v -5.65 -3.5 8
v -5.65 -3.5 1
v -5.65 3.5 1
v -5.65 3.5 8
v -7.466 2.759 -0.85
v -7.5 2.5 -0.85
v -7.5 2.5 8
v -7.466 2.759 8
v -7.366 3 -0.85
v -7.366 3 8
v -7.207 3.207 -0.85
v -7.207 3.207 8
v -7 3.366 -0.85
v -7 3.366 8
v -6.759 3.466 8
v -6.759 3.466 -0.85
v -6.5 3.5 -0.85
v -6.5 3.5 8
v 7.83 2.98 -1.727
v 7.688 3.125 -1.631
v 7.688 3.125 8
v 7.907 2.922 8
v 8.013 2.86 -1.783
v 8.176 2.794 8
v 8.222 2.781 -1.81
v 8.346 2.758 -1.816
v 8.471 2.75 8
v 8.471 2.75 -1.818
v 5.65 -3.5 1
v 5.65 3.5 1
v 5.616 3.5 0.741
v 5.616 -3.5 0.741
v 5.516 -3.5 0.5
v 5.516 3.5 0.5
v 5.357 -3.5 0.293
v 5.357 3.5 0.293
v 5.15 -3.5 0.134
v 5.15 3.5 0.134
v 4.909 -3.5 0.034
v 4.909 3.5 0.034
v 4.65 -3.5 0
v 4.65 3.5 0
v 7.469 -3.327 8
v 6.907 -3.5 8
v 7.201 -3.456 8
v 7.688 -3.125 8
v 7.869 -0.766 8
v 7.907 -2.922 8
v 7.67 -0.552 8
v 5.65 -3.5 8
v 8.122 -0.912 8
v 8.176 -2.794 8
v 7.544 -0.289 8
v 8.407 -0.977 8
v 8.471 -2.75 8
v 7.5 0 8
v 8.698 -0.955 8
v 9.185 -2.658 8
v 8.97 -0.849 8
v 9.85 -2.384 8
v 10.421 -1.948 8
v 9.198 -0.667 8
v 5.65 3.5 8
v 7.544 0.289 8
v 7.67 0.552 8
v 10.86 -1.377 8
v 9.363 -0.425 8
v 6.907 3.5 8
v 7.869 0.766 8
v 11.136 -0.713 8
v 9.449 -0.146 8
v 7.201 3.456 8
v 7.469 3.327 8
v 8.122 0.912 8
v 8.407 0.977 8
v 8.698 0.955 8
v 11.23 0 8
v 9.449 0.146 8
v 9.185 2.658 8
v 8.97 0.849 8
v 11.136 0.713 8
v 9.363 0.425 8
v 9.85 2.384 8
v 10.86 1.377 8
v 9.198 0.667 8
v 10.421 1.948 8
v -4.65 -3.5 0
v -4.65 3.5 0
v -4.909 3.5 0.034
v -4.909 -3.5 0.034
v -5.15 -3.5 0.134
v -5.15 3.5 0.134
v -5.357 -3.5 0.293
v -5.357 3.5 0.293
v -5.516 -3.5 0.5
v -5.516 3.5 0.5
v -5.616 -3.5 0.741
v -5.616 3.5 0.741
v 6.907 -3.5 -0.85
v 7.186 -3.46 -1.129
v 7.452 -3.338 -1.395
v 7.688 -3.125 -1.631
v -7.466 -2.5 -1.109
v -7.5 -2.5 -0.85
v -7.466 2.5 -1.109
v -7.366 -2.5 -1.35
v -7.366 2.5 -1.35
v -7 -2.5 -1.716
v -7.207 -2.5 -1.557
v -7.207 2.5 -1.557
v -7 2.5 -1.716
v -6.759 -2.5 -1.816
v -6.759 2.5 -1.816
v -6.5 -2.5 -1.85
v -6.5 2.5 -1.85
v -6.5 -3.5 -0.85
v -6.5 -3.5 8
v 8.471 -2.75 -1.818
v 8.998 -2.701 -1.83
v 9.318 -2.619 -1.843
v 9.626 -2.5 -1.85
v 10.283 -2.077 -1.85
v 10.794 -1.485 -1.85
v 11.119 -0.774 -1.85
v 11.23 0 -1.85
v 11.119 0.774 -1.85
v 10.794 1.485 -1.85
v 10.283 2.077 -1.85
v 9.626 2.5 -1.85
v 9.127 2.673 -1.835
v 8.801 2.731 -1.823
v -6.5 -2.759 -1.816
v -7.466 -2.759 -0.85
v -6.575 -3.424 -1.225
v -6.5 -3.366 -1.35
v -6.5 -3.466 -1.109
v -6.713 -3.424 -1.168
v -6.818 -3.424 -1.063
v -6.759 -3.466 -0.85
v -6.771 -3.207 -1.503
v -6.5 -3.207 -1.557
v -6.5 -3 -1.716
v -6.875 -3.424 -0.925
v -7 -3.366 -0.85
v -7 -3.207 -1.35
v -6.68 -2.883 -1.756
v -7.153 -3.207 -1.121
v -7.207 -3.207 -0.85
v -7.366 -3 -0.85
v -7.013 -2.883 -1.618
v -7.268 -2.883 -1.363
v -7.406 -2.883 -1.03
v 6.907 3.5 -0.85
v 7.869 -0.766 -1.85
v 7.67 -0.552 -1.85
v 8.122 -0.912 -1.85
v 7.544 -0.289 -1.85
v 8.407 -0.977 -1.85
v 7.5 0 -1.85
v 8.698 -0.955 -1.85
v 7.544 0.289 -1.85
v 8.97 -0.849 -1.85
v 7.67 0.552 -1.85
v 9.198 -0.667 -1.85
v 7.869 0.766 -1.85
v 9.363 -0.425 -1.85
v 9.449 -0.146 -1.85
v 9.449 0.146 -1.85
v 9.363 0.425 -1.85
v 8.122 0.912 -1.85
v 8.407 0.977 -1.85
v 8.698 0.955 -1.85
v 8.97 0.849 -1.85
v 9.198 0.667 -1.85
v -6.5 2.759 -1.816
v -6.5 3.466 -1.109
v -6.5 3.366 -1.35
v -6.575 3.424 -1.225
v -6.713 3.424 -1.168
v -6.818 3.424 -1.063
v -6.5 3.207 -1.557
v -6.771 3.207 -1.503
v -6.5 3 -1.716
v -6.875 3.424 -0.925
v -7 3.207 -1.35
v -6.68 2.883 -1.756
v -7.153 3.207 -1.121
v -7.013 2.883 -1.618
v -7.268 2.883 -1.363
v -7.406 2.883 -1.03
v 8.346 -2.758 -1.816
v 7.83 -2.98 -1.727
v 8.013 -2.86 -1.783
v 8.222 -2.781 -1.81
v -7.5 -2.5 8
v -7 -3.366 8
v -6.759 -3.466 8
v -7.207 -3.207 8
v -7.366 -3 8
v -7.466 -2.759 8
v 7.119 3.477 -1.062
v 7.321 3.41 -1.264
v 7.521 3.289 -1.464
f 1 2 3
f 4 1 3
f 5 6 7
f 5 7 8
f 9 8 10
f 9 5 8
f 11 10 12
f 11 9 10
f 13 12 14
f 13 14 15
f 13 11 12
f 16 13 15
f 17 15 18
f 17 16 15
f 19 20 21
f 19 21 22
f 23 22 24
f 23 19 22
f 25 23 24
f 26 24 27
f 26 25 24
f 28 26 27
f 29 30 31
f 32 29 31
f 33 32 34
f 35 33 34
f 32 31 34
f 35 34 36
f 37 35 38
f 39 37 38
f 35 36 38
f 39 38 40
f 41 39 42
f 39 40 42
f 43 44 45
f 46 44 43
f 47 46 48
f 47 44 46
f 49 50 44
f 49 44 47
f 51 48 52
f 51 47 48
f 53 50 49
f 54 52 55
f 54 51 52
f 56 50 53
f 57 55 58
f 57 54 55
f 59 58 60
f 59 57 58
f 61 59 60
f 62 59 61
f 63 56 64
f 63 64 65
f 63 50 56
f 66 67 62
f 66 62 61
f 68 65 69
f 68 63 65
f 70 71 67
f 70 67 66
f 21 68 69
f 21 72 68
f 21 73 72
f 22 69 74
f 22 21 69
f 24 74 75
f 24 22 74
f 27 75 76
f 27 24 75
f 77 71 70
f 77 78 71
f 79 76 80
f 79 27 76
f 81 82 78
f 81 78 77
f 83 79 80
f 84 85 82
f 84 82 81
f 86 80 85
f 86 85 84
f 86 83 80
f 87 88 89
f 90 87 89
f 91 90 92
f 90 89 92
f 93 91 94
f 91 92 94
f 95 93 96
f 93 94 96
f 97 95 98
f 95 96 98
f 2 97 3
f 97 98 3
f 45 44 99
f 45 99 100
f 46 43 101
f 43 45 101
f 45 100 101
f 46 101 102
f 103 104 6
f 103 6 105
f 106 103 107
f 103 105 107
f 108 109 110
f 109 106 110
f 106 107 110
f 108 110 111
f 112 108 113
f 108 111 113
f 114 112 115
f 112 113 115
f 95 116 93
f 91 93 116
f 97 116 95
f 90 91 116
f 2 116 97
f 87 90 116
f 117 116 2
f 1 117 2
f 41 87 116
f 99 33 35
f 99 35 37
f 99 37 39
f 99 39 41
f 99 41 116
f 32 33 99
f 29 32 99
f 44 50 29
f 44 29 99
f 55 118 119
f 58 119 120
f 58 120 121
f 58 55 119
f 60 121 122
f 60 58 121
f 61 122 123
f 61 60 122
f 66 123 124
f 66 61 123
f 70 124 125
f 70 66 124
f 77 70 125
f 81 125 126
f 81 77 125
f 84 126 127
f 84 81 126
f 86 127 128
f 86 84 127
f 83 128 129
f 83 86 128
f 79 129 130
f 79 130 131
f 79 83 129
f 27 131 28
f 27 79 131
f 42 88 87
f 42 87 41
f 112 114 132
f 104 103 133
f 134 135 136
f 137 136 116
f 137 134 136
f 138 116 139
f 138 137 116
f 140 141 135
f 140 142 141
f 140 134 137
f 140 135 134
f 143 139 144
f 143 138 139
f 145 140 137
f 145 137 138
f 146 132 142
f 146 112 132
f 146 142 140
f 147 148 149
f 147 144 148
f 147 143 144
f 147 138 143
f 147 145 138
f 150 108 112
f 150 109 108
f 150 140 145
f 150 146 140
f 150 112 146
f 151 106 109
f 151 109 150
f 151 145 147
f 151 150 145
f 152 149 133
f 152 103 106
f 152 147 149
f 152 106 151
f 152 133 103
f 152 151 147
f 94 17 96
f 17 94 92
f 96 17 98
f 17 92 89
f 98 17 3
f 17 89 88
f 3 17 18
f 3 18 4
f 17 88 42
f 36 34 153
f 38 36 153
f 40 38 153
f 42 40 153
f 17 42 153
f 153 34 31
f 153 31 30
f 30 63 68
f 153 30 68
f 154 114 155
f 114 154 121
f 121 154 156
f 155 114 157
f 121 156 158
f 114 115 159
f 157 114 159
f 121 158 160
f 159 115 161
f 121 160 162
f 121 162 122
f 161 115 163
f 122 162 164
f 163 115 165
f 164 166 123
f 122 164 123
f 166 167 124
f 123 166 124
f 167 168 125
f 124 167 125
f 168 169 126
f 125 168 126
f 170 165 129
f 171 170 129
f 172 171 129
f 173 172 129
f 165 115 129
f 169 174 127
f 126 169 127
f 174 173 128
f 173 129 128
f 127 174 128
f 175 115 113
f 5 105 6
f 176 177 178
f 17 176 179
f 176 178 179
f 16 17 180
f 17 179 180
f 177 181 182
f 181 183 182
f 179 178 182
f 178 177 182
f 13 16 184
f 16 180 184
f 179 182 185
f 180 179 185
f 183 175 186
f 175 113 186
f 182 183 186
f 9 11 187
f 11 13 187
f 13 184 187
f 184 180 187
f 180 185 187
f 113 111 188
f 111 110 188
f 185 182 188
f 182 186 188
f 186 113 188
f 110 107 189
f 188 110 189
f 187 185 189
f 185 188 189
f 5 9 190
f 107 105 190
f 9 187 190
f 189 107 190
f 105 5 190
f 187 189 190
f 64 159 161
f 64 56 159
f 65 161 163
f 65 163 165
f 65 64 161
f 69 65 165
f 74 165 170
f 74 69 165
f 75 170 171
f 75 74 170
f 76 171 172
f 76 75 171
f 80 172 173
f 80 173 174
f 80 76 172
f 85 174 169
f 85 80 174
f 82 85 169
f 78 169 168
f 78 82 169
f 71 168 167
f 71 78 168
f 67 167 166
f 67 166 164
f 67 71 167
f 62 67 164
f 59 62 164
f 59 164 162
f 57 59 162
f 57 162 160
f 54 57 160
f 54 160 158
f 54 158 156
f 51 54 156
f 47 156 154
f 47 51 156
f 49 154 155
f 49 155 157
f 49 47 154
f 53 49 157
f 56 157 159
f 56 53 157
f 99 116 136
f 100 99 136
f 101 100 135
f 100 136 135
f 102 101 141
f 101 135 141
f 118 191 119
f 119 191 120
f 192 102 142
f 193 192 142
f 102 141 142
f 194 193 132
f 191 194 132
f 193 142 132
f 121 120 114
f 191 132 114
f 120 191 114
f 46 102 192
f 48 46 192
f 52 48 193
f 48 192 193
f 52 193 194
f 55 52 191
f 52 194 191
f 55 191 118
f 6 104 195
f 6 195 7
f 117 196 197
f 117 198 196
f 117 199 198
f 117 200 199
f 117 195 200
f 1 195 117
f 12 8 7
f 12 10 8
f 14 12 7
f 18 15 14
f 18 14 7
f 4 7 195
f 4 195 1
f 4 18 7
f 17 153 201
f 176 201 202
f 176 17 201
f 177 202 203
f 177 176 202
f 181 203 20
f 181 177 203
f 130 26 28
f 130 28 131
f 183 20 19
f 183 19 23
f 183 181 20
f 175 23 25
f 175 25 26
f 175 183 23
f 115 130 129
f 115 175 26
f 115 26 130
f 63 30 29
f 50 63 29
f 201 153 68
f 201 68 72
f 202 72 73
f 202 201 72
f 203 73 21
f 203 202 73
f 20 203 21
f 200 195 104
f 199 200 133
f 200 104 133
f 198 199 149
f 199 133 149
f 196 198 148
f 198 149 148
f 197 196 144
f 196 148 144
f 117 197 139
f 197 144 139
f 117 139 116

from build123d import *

# Parameters (mm, degrees)
F0_W         = 1.85
F0_H         = 7
F0_W_2       = 11.3
F1_DEPTH     = 1.85
F2_DEPTH     = 8
F3_T1_DEPTH  = 9.85
F3_T3_DEPTH  = 9.85
F3_T5_DEPTH  = 7
F3_T7_DEPTH  = 7
F3_T9_DEPTH  = 12
F4_T1_DEPTH  = 11.35
F4_T3_DEPTH  = 16.5
F4_T5_DEPTH  = 12.8150682373
F4_T8_ANGLE  = 90.0000000053
F4_T10_ANGLE = 90.0000000053


# Not quite as in the source:
# - a fillet or chamfer that OpenCascade refuses, or shapes differently, is made with other operations: its cross-section is extruded or revolved along the edge and cut away or added


with BuildPart() as f1:
    # F0 (on Top) → F1 (new body)
    with BuildSketch(Plane.XY):
        with Locations((-6.575, 0)):
            Rectangle(F0_W, F0_H)
        Rectangle(F0_W_2, F0_H)
        with BuildLine():
            Line((7.5, 0), (7.5, 2.5694551952))
            ThreePointArc((7.5, 2.5694551952), (5.73, 0), (7.5, -2.5694551952))
            Line((7.5, -2.5694551952), (7.5, 0))
        make_face()
        with BuildLine():
            Line((7.5, 2.5694551952), (7.5, 3.5))
            Line((7.5, 3.5), (5.65, 3.5))
            Line((5.65, 3.5), (5.65, -3.5))
            Line((5.65, -3.5), (7.5, -3.5))
            Line((7.5, -3.5), (7.5, -2.5694551952))
            ThreePointArc((7.5, -2.5694551952), (5.73, 0), (7.5, 2.5694551952))
        make_face()
        with BuildLine():
            ThreePointArc((11.23, 0), (10.0400480762, 2.2646743695), (7.5, 2.5694551952))
            Line((7.5, 2.5694551952), (7.5, 0))
            Line((7.5, 0), (7.5, -2.5694551952))
            ThreePointArc((7.5, -2.5694551952), (10.0400480762, -2.2646743695), (11.23, 0))
        make_face()
        with BuildLine():
            ThreePointArc((9.46, 0), (8.48, -0.98), (7.5, 0))
            ThreePointArc((7.5, 0), (8.48, 0.98), (9.46, 0))
        make_face(mode=Mode.SUBTRACT)
    extrude(amount=-F1_DEPTH)

    # F0 (on Top) → F2 (join)
    with BuildSketch(Plane.XY):
        with Locations((-6.575, 0)):
            Rectangle(F0_W, F0_H)
        with BuildLine():
            Line((7.5, 2.5694551952), (7.5, 3.5))
            Line((7.5, 3.5), (5.65, 3.5))
            Line((5.65, 3.5), (5.65, -3.5))
            Line((5.65, -3.5), (7.5, -3.5))
            Line((7.5, -3.5), (7.5, -2.5694551952))
            ThreePointArc((7.5, -2.5694551952), (5.73, 0), (7.5, 2.5694551952))
        make_face()
        with BuildLine():
            Line((7.5, 0), (7.5, 2.5694551952))
            ThreePointArc((7.5, 2.5694551952), (5.73, 0), (7.5, -2.5694551952))
            Line((7.5, -2.5694551952), (7.5, 0))
        make_face()
        with BuildLine():
            ThreePointArc((11.23, 0), (10.0400480762, 2.2646743695), (7.5, 2.5694551952))
            Line((7.5, 2.5694551952), (7.5, 0))
            Line((7.5, 0), (7.5, -2.5694551952))
            ThreePointArc((7.5, -2.5694551952), (10.0400480762, -2.2646743695), (11.23, 0))
        make_face()
        with BuildLine():
            ThreePointArc((9.46, 0), (8.48, -0.98), (7.5, 0))
            ThreePointArc((7.5, 0), (8.48, 0.98), (9.46, 0))
        make_face(mode=Mode.SUBTRACT)
    extrude(amount=F2_DEPTH)

    # F3: fillet of radius 1 on 5 edges, made by hand

    # F3_s2 → F3_t1 (join)
    with BuildSketch(Plane.XY.offset(-1.85)):
        with BuildLine():
            ThreePointArc((7.5, 3.5), (7.8571098794, 2.9584596209), (8.4713837652, 2.7499865019))
            ThreePointArc((8.4713837652, 2.7499865019), (7.9775177584, 2.7037033116), (7.5, 2.5694551952))
            Line((7.5, 2.5694551952), (7.5, 3.5))
        make_face()
    extrude(amount=F3_T1_DEPTH)

    # F3_s4 → F3_t3 (join)
    with BuildSketch(Plane.XY.offset(-1.85)):
        with BuildLine():
            ThreePointArc((7.5, -3.5), (7.8571098794, -2.9584596209), (8.4713837652, -2.7499865019))
            ThreePointArc((8.4713837652, -2.7499865019), (7.9775177584, -2.7037033116), (7.5, -2.5694551952))
            Line((7.5, -2.5694551952), (7.5, -3.5))
        make_face()
    extrude(amount=F3_T3_DEPTH)

    # F3_s6 → F3_t5 (join)
    with BuildSketch(Plane.XZ.offset(-3.5)):
        with BuildLine():
            ThreePointArc((5.65, 1), (5.3571067812, 0.2928932188), (4.65, 0))
            Line((4.65, 0), (5.65, 0))
            Line((5.65, 0), (5.65, 1))
        make_face()
    extrude(amount=F3_T5_DEPTH)

    # F3_s8 → F3_t7 (join)
    with BuildSketch(Plane.XZ.offset(-3.5)):
        with BuildLine():
            ThreePointArc((-4.65, 0), (-5.3571067812, 0.2928932188), (-5.65, 1))
            Line((-5.65, 1), (-5.65, 0))
            Line((-5.65, 0), (-4.65, 0))
        make_face()
    extrude(amount=F3_T7_DEPTH)

    # F3_s10 → F3_t9 (cut)
    with BuildSketch(Plane.XZ.offset(-6)):
        with BuildLine():
            ThreePointArc((-7.5, -0.85), (-7.2071067812, -1.5571067812), (-6.5, -1.85))
            Line((-6.5, -1.85), (-7.5, -1.85))
            Line((-7.5, -1.85), (-7.5, -0.85))
        make_face()
    extrude(amount=F3_T9_DEPTH, mode=Mode.SUBTRACT)

    # F4: fillet of radius 1 on 8 edges, made by hand

    # F4_s2 → F4_t1 (cut)
    with BuildSketch(Plane.XY.offset(-0.85)):
        with BuildLine():
            ThreePointArc((-7.5, 2.5), (-7.2071067812, 3.2071067812), (-6.5, 3.5))
            Line((-6.5, 3.5), (-7.5, 3.5))
            Line((-7.5, 3.5), (-7.5, 2.5))
        make_face()
        with BuildLine():
            ThreePointArc((-7.5, -2.5), (-7.2071067812, -3.2071067812), (-6.5, -3.5))
            Line((-6.5, -3.5), (-7.5, -3.5))
            Line((-7.5, -3.5), (-7.5, -2.5))
        make_face()
    extrude(amount=F4_T1_DEPTH, mode=Mode.SUBTRACT)

    # F4_s4 → F4_t3 (cut)
    with BuildSketch(Plane.YZ.offset(-6.5)):
        with BuildLine():
            ThreePointArc((3.5, -0.85), (3.2071067812, -1.5571067812), (2.5, -1.85))
            Line((2.5, -1.85), (3.5, -1.85))
            Line((3.5, -1.85), (3.5, -0.85))
        make_face()
        with BuildLine():
            ThreePointArc((-3.5, -0.85), (-3.2071067812, -1.5571067812), (-2.5, -1.85))
            Line((-2.5, -1.85), (-3.5, -1.85))
            Line((-3.5, -1.85), (-3.5, -0.85))
        make_face()
    extrude(amount=F4_T3_DEPTH, mode=Mode.SUBTRACT)

    # F4_s6 → F4_t5 (cut)
    with BuildSketch(Plane.XY.offset(-3.3325341187)):
        with BuildLine():
            ThreePointArc((6.9069863525, 3.5), (7.3400043679, 3.4013852663), (7.6876184707, 3.1249907968))
            ThreePointArc((7.6876184707, 3.1249907968), (7.5739320459, 3.3025507681), (7.5, 3.5))
            Line((7.5, 3.5), (6.9069863525, 3.5))
        make_face()
        with BuildLine():
            ThreePointArc((6.9069863525, -3.5), (7.3400043679, -3.4013852663), (7.6876184707, -3.1249907968))
            ThreePointArc((7.6876184707, -3.1249907968), (7.5739320459, -3.3025507681), (7.5, -3.5))
            Line((7.5, -3.5), (6.9069863525, -3.5))
        make_face()
    extrude(amount=F4_T5_DEPTH, mode=Mode.SUBTRACT)

    # F4_s7 → F4_t8 (revolve, cut)
    with BuildSketch(Plane.YZ.offset(-6.5)):
        with BuildLine():
            ThreePointArc((3.5, -0.85), (3.2071067812, -1.5571067812), (2.5, -1.85))
            Line((2.5, -1.85), (3.5, -1.85))
            Line((3.5, -1.85), (3.5, -0.85))
        make_face()
    revolve(axis=Axis((-6.5, 3.5, -0.85), (0, 1, 0)), revolution_arc=F4_T8_ANGLE, mode=Mode.SUBTRACT)

    # F4_s9 → F4_t10 (revolve, cut)
    with BuildSketch(Plane.YZ.offset(-6.5)):
        with BuildLine():
            ThreePointArc((-3.5, -0.85), (-3.2071067812, -1.5571067812), (-2.5, -1.85))
            Line((-2.5, -1.85), (-3.5, -1.85))
            Line((-3.5, -1.85), (-3.5, -0.85))
        make_face()
    revolve(axis=Axis((-6.5, -3.5, -0.85), (0, 1, 0)), revolution_arc=F4_T10_ANGLE, mode=Mode.SUBTRACT)


solid = f1.part
